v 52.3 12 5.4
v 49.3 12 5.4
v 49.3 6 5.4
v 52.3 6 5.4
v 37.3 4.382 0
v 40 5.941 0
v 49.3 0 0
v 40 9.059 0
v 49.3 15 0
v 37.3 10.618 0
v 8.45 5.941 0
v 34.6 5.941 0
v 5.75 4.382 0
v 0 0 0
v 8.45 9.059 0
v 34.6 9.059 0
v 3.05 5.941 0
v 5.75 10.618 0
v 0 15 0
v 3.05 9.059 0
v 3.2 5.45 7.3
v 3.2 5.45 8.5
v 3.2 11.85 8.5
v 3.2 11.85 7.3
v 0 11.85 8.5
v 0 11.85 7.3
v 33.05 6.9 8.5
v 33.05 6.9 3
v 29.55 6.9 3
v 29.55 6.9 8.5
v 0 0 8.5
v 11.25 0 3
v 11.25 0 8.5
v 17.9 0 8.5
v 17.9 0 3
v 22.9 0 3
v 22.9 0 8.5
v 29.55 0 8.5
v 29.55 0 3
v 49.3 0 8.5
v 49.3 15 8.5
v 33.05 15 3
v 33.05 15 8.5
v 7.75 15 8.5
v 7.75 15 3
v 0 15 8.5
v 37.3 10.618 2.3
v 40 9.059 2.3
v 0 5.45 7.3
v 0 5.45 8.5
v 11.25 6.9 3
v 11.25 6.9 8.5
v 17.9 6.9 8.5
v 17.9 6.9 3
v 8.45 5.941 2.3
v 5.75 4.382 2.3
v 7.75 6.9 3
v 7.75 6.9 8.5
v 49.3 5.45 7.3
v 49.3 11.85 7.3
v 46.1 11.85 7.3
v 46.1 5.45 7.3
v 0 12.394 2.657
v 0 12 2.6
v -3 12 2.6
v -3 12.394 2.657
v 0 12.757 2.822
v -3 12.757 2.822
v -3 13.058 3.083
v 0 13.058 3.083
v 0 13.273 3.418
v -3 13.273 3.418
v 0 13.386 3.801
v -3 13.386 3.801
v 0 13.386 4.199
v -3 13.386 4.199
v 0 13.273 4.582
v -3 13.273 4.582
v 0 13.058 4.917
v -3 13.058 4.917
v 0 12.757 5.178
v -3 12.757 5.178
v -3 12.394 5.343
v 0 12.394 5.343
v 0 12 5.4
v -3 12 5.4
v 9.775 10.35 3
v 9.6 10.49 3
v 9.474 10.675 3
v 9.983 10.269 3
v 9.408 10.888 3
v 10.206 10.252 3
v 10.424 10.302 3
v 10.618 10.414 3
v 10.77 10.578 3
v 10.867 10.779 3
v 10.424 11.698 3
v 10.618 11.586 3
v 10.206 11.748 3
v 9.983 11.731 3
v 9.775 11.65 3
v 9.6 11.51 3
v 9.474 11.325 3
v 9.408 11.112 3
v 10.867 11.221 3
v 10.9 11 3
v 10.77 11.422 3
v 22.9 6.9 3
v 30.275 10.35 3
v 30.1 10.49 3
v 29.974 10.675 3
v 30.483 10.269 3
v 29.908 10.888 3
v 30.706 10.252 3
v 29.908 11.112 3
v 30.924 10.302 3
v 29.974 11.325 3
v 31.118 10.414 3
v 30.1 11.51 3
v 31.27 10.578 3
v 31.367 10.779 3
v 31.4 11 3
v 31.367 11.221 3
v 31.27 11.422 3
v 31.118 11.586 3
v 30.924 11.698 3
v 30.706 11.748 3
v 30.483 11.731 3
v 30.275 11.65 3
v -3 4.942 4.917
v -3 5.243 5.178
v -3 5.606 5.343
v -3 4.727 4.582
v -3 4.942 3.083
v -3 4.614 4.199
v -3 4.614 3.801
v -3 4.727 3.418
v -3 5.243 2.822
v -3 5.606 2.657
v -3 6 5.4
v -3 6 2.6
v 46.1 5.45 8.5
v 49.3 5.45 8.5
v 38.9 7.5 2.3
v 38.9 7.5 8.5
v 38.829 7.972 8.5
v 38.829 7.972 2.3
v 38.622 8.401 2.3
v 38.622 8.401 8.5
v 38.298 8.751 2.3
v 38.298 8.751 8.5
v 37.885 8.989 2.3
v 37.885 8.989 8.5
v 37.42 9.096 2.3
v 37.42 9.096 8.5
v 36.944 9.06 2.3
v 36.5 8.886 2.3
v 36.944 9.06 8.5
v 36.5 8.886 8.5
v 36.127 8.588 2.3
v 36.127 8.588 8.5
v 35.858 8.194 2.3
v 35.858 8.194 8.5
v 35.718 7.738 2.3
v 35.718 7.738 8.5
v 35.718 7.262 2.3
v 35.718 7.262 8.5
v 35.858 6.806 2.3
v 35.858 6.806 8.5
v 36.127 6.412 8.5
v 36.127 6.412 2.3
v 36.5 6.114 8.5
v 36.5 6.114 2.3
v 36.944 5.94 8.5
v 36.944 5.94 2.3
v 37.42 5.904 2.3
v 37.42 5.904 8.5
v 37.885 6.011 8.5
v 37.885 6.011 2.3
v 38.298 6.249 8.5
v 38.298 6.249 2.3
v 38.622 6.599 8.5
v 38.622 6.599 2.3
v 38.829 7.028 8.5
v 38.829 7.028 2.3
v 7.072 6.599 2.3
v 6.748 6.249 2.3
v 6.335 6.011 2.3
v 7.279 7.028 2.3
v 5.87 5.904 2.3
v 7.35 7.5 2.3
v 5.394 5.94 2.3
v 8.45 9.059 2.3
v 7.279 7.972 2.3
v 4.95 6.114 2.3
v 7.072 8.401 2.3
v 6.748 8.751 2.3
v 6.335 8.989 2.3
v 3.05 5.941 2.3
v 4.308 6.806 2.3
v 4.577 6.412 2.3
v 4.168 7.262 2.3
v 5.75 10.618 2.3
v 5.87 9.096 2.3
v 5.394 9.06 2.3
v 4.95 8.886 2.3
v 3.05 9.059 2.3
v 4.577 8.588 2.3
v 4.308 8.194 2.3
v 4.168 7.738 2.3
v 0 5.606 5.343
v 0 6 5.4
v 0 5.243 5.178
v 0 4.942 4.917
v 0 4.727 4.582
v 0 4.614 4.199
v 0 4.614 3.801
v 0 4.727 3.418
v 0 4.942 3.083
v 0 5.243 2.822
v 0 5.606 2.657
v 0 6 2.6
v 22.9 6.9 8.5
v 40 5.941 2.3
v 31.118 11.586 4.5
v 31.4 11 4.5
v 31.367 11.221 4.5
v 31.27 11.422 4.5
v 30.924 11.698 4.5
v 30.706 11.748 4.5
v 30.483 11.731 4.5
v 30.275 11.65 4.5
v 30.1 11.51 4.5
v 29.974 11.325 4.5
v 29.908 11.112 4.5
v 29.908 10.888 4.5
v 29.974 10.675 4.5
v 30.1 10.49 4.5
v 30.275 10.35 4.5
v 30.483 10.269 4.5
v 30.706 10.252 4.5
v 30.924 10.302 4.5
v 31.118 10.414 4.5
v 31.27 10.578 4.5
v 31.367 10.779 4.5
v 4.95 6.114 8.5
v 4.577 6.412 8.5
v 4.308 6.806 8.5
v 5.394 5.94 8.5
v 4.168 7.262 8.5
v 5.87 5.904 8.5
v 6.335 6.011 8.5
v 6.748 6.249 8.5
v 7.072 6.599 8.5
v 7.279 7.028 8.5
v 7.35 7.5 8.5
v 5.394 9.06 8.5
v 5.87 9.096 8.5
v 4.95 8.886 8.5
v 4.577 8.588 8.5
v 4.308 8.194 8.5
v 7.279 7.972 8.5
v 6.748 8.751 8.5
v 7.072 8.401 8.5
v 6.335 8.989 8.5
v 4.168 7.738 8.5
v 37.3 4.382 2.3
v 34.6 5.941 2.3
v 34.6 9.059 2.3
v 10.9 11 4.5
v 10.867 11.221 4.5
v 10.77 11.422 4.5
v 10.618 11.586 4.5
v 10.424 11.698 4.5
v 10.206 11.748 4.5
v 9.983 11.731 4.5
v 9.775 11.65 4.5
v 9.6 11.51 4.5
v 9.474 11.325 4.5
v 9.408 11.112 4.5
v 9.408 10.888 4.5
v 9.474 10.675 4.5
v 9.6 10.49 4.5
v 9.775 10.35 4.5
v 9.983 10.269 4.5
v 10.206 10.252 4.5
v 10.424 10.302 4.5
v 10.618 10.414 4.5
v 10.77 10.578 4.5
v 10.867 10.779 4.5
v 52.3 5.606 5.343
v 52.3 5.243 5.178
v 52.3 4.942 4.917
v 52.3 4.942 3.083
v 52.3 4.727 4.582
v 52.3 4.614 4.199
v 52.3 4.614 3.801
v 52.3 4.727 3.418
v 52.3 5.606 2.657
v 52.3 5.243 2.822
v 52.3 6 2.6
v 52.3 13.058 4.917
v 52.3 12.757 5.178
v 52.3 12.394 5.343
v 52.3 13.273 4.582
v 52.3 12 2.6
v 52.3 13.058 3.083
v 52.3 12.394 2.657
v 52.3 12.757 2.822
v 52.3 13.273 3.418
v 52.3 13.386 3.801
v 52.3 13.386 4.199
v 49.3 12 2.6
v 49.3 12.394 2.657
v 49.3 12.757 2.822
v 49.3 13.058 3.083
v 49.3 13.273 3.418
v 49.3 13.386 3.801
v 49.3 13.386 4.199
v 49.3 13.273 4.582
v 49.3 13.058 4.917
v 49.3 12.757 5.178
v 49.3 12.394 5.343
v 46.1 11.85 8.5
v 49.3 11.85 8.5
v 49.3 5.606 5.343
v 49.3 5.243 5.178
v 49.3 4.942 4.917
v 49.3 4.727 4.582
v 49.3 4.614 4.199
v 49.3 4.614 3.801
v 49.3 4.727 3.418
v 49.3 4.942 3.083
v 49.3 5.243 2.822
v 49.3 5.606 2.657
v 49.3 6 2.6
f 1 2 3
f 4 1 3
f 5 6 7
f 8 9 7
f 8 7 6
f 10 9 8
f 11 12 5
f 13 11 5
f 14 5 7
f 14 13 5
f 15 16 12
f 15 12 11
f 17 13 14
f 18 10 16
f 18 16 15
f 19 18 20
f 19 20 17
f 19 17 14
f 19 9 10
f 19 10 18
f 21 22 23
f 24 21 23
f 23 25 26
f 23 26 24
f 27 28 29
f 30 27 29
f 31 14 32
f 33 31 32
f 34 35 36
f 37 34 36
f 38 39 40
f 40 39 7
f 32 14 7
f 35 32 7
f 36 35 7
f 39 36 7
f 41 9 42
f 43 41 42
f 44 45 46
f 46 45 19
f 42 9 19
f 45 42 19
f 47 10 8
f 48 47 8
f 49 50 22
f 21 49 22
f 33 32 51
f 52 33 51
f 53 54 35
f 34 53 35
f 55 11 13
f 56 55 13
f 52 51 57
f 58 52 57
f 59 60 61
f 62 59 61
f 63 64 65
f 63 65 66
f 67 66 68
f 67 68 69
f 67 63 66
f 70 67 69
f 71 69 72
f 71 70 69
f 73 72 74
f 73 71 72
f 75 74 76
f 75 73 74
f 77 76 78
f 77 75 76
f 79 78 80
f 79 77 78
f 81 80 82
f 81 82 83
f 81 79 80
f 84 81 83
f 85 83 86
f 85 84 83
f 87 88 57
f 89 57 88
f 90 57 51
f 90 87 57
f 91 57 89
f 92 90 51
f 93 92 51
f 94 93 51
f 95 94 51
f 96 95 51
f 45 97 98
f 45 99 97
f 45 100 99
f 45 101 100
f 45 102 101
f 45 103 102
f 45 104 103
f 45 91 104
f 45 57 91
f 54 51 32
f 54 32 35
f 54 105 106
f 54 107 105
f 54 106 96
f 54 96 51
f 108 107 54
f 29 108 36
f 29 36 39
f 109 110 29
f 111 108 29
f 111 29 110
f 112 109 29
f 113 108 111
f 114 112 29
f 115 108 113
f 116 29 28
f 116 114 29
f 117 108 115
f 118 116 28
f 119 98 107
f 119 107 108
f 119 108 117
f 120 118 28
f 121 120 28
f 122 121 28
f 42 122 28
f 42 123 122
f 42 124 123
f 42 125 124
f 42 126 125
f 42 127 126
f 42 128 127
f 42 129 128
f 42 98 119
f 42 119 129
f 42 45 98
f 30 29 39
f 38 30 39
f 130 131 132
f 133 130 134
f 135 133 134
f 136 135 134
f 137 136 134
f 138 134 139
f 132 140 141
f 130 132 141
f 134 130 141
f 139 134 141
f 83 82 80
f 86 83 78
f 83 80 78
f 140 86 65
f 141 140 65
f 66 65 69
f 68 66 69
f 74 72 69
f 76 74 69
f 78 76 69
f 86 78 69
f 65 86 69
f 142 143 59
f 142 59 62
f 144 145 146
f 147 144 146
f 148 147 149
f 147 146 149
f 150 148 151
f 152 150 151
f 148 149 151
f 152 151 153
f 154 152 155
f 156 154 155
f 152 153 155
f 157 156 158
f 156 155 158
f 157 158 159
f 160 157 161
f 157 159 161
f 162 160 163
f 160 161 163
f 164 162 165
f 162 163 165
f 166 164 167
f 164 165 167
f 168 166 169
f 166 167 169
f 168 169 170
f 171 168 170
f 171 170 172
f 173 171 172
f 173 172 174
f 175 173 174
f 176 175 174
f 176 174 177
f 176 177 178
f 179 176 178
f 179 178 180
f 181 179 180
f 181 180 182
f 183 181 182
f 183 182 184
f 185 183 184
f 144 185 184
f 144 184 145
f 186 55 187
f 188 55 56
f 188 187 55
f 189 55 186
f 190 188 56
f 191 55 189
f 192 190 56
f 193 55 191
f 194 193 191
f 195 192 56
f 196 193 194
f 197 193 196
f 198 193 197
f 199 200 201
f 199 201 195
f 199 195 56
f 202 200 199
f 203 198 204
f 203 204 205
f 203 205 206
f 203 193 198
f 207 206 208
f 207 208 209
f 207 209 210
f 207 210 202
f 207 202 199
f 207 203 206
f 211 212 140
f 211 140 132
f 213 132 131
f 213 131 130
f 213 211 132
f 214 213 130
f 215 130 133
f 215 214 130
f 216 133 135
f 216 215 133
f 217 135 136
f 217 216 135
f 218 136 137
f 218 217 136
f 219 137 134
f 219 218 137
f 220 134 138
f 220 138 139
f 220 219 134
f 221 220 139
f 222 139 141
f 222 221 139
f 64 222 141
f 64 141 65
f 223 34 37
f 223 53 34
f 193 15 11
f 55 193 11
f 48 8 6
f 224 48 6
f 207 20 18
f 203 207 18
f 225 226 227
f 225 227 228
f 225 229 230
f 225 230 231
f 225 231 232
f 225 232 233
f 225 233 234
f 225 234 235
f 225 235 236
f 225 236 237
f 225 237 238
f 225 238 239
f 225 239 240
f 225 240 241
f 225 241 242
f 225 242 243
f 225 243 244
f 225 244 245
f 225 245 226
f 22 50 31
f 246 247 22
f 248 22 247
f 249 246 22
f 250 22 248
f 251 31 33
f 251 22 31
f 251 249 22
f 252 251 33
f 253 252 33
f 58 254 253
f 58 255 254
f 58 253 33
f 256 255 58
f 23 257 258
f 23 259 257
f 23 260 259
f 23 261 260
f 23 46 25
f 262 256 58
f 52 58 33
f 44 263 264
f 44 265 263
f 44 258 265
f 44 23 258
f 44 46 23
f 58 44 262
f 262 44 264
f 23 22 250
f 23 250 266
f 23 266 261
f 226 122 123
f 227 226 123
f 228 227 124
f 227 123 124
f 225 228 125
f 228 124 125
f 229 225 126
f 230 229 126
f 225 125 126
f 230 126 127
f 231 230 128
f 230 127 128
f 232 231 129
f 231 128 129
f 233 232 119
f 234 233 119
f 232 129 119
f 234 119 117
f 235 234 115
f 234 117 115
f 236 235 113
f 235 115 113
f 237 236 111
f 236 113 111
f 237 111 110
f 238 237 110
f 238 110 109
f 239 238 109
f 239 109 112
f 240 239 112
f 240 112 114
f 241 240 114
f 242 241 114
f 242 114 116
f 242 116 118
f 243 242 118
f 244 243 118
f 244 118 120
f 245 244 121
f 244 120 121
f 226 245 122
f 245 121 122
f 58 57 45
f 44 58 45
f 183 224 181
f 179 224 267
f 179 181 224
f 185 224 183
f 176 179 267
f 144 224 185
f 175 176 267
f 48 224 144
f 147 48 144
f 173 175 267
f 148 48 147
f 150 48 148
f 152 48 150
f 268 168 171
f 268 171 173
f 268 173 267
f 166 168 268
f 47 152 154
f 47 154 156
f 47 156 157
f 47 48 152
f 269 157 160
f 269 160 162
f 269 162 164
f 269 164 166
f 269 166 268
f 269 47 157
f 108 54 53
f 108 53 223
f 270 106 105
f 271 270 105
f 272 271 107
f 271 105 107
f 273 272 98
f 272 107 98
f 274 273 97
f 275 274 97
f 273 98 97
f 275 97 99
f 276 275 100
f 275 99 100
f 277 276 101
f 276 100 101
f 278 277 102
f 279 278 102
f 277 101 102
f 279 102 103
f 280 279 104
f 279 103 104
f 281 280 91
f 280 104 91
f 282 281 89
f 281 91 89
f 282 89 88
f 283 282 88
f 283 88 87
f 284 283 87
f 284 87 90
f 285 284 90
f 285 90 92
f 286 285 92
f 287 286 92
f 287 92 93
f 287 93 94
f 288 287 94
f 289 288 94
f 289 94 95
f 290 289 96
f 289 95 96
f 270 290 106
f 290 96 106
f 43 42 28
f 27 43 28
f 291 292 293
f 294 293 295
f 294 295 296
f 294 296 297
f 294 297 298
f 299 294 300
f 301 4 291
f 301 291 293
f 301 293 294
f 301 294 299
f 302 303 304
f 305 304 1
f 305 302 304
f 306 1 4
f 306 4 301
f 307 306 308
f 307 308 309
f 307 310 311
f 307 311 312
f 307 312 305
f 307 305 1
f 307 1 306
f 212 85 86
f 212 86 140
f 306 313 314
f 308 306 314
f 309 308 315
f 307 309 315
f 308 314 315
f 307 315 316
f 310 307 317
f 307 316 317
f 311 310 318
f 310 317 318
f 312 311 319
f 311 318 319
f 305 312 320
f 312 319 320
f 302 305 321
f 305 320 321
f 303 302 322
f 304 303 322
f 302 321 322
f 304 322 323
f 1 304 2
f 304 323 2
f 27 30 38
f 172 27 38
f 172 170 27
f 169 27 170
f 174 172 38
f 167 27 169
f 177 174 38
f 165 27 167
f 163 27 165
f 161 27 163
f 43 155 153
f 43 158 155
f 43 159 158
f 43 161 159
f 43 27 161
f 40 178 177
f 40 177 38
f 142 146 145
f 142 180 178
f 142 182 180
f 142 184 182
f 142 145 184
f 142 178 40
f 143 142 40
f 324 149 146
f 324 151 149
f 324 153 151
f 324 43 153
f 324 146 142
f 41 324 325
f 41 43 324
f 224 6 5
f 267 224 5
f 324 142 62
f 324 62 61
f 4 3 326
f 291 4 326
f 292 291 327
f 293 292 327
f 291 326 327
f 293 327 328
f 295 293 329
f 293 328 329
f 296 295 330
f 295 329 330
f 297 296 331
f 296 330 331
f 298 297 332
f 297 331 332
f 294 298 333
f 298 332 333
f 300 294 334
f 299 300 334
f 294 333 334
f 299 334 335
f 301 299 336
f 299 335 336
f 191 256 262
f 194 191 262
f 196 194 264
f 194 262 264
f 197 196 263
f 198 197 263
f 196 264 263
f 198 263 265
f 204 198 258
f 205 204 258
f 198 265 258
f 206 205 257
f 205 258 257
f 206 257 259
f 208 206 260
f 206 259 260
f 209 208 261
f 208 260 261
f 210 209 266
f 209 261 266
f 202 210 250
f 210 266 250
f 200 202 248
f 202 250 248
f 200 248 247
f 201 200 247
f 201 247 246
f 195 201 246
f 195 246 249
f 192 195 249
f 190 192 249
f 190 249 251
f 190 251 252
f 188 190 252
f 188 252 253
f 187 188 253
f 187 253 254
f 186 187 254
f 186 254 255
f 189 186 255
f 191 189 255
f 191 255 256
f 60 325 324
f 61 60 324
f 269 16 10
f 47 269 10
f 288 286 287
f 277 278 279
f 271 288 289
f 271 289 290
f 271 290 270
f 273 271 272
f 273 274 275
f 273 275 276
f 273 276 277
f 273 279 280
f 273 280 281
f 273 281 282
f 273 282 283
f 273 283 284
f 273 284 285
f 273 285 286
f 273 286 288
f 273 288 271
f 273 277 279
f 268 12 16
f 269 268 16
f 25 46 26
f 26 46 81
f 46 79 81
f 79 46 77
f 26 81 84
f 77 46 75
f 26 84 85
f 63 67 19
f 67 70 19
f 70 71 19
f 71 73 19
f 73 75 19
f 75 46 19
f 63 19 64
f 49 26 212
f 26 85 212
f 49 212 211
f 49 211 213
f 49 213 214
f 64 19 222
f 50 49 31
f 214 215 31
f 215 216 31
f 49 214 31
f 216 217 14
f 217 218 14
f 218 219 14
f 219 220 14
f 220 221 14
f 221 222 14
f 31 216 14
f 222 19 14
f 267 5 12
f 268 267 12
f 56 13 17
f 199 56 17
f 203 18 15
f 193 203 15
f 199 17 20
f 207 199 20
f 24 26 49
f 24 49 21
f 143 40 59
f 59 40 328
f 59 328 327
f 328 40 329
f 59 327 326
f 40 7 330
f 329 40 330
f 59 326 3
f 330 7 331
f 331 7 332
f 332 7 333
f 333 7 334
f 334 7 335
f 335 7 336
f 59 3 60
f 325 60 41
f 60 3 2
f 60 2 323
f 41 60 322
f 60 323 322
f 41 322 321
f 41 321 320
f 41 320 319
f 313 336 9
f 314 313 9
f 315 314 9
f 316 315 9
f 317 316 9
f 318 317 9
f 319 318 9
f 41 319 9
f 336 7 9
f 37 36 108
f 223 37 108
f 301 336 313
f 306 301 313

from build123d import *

# Parameters (mm, degrees)
SKETCH_1_W          = 49.3
SKETCH_1_H          = 15
EXTRUDE_1_DEPTH     = 3
SKETCH_2_W          = 5
SKETCH_2_H          = 4.567504656
SKETCH_2_H_2        = 2.332495344
EXTRUDE_2_DEPTH     = 5.5
SKETCH_3_R          = 0.75
EXTRUDE_3_DEPTH     = 1.5
SKETCH_4_R          = 1
CUT_EXTRUDE_1_DEPTH = 10
CUT_EXTRUDE_2_DEPTH = 4
EXTRUDE_4_DEPTH     = 3
SKETCH_9_R          = 1
EXTRUDE_5_DEPTH     = 4.5
EXTRUDE_9_DEPTH     = 4
SKETCH_8_R          = 1.6
CUT_EXTRUDE_3_DEPTH = 56.068502794
CUT_EXTRUDE_4_DEPTH = 2.3
SKETCH_13_W         = 3.2
SKETCH_13_H         = 6.4
CUT_EXTRUDE_5_DEPTH = 1.2


with BuildPart() as part:
    # 草图1 → 凸台-拉伸1 (new body)
    with BuildSketch(Plane.XY):
        with Locations((24.65, 7.5)):
            Rectangle(SKETCH_1_W, SKETCH_1_H)
    extrude(amount=EXTRUDE_1_DEPTH)

    # 草图2 → 凸台-拉伸2 (add)
    with BuildSketch(Plane.XY.offset(3)):
        Polygon((7.75, 6.9), (7.75, 15), (0, 15), (0, 0), (11.25, 0), (11.25, 6.9), align=None)
        with Locations((20.4, 2.283752328)):
            Rectangle(SKETCH_2_W, SKETCH_2_H)
        with Locations((20.4, 5.733752328)):
            Rectangle(SKETCH_2_W, SKETCH_2_H_2)
        Polygon((49.3, 15), (33.05, 15), (33.05, 6.9), (29.55, 6.9), (29.55, 0), (49.3, 0), align=None)
    extrude(amount=EXTRUDE_2_DEPTH)

    # 草图3 → 凸台-拉伸3 (add)
    with BuildSketch(Plane.XY.offset(3)):
        with Locations((10.15, 11)):
            Circle(SKETCH_3_R)
        with Locations((30.65, 11)):
            Circle(SKETCH_3_R)
    extrude(amount=EXTRUDE_3_DEPTH)

    # 草图4 → 切除-拉伸1 (cut)
    with BuildSketch(Plane.XY.offset(8.5)):
        with Locations((3.875, 7.5)):
            Circle(SKETCH_4_R)
        with Locations((41.175, 7.5)):
            Circle(SKETCH_4_R)
    extrude(amount=-CUT_EXTRUDE_1_DEPTH, mode=Mode.SUBTRACT)

    # 草图5 → 切除-拉伸2 (cut)
    with BuildSketch(Plane(origin=(0, 0, 0), x_dir=(-1, 0, 0), z_dir=(0, 0, -1))):
        Polygon((-5.000833025, 9.45), (-6.12666605, 7.5), (-5.000833025, 5.55), (-2.749166975, 5.55), (-1.62333395, 7.5), (-2.749166975, 9.45), align=None)
        Polygon((-42.300833025, 9.45), (-43.42666605, 7.5), (-42.300833025, 5.55), (-40.049166975, 5.55), (-38.92333395, 7.5), (-40.049166975, 9.45), align=None)
    extrude(amount=-CUT_EXTRUDE_2_DEPTH, mode=Mode.SUBTRACT)

    # 草图6 → 凸台-拉伸4 (add)
    with BuildSketch(Plane.ZY):
        with BuildLine():
            Line((2.6, 6), (2.6, 12))
            ThreePointArc((2.6, 12), (4, 13.4), (5.4, 12))
            Line((5.4, 12), (5.4, 6))
            ThreePointArc((5.4, 6), (4, 4.6), (2.6, 6))
        make_face()
    extrude_4 = extrude(amount=EXTRUDE_4_DEPTH)

    # 镜向1: 凸台-拉伸4 across plane
    add(extrude_4.mirror(Plane.ZY.offset(-24.65)))

    # 草图9 → 凸台-拉伸5 (add)
    with BuildSketch(Plane.XY.offset(8.5)):
        with Locations((41.175, 7.5)):
            Circle(SKETCH_9_R)
        with Locations((3.875, 7.5)):
            Circle(SKETCH_9_R)
    extrude(amount=-EXTRUDE_5_DEPTH)

    # 草图10 → 凸台-拉伸9 (add)
    with BuildSketch(Plane(origin=(0, 0, 0), x_dir=(-1, 0, 0), z_dir=(0, 0, -1))):
        Polygon((-2.749166975, 9.45), (-5.000833025, 9.45), (-6.12666605, 7.5), (-5.000833025, 5.55), (-2.749166975, 5.55), (-1.62333395, 7.5), align=None)
        Polygon((-40.049166975, 9.45), (-42.300833025, 9.45), (-43.42666605, 7.5), (-42.300833025, 5.55), (-40.049166975, 5.55), (-38.92333395, 7.5), align=None)
    extrude(amount=-EXTRUDE_9_DEPTH)

    # 草图8 → 切除-拉伸3 (cut, through all)
    with BuildSketch(Plane.XY.offset(8.5)):
        with Locations((5.75, 7.5)):
            Circle(SKETCH_8_R)
        with Locations((37.3, 7.5)):
            Circle(SKETCH_8_R)
    extrude(amount=-CUT_EXTRUDE_3_DEPTH, mode=Mode.SUBTRACT)

    # 草图11 → 切除-拉伸4 (cut)
    with BuildSketch(Plane(origin=(0, 0, 0), x_dir=(-1, 0, 0), z_dir=(0, 0, -1))):
        Polygon((-37.3, 10.617691454), (-40, 9.058845727), (-40, 5.941154273), (-37.3, 4.382308546), (-34.6, 5.941154273), (-34.6, 9.058845727), align=None)
        Polygon((-5.75, 10.617691454), (-8.45, 9.058845727), (-8.45, 5.941154273), (-5.75, 4.382308546), (-3.05, 5.941154273), (-3.05, 9.058845727), align=None)
    extrude(amount=-CUT_EXTRUDE_4_DEPTH, mode=Mode.SUBTRACT)

    # 草图13 → 切除-拉伸5 (cut)
    with BuildSketch(Plane.XY.offset(8.5)):
        with Locations((1.6, 8.65)):
            Rectangle(SKETCH_13_W, SKETCH_13_H)
    cut_extrude_5 = extrude(amount=-CUT_EXTRUDE_5_DEPTH, mode=Mode.SUBTRACT)

    # 镜向2: 切除-拉伸5 across plane
    add(cut_extrude_5.mirror(Plane.ZY.offset(-24.65)), mode=Mode.SUBTRACT)


solid = part.part
